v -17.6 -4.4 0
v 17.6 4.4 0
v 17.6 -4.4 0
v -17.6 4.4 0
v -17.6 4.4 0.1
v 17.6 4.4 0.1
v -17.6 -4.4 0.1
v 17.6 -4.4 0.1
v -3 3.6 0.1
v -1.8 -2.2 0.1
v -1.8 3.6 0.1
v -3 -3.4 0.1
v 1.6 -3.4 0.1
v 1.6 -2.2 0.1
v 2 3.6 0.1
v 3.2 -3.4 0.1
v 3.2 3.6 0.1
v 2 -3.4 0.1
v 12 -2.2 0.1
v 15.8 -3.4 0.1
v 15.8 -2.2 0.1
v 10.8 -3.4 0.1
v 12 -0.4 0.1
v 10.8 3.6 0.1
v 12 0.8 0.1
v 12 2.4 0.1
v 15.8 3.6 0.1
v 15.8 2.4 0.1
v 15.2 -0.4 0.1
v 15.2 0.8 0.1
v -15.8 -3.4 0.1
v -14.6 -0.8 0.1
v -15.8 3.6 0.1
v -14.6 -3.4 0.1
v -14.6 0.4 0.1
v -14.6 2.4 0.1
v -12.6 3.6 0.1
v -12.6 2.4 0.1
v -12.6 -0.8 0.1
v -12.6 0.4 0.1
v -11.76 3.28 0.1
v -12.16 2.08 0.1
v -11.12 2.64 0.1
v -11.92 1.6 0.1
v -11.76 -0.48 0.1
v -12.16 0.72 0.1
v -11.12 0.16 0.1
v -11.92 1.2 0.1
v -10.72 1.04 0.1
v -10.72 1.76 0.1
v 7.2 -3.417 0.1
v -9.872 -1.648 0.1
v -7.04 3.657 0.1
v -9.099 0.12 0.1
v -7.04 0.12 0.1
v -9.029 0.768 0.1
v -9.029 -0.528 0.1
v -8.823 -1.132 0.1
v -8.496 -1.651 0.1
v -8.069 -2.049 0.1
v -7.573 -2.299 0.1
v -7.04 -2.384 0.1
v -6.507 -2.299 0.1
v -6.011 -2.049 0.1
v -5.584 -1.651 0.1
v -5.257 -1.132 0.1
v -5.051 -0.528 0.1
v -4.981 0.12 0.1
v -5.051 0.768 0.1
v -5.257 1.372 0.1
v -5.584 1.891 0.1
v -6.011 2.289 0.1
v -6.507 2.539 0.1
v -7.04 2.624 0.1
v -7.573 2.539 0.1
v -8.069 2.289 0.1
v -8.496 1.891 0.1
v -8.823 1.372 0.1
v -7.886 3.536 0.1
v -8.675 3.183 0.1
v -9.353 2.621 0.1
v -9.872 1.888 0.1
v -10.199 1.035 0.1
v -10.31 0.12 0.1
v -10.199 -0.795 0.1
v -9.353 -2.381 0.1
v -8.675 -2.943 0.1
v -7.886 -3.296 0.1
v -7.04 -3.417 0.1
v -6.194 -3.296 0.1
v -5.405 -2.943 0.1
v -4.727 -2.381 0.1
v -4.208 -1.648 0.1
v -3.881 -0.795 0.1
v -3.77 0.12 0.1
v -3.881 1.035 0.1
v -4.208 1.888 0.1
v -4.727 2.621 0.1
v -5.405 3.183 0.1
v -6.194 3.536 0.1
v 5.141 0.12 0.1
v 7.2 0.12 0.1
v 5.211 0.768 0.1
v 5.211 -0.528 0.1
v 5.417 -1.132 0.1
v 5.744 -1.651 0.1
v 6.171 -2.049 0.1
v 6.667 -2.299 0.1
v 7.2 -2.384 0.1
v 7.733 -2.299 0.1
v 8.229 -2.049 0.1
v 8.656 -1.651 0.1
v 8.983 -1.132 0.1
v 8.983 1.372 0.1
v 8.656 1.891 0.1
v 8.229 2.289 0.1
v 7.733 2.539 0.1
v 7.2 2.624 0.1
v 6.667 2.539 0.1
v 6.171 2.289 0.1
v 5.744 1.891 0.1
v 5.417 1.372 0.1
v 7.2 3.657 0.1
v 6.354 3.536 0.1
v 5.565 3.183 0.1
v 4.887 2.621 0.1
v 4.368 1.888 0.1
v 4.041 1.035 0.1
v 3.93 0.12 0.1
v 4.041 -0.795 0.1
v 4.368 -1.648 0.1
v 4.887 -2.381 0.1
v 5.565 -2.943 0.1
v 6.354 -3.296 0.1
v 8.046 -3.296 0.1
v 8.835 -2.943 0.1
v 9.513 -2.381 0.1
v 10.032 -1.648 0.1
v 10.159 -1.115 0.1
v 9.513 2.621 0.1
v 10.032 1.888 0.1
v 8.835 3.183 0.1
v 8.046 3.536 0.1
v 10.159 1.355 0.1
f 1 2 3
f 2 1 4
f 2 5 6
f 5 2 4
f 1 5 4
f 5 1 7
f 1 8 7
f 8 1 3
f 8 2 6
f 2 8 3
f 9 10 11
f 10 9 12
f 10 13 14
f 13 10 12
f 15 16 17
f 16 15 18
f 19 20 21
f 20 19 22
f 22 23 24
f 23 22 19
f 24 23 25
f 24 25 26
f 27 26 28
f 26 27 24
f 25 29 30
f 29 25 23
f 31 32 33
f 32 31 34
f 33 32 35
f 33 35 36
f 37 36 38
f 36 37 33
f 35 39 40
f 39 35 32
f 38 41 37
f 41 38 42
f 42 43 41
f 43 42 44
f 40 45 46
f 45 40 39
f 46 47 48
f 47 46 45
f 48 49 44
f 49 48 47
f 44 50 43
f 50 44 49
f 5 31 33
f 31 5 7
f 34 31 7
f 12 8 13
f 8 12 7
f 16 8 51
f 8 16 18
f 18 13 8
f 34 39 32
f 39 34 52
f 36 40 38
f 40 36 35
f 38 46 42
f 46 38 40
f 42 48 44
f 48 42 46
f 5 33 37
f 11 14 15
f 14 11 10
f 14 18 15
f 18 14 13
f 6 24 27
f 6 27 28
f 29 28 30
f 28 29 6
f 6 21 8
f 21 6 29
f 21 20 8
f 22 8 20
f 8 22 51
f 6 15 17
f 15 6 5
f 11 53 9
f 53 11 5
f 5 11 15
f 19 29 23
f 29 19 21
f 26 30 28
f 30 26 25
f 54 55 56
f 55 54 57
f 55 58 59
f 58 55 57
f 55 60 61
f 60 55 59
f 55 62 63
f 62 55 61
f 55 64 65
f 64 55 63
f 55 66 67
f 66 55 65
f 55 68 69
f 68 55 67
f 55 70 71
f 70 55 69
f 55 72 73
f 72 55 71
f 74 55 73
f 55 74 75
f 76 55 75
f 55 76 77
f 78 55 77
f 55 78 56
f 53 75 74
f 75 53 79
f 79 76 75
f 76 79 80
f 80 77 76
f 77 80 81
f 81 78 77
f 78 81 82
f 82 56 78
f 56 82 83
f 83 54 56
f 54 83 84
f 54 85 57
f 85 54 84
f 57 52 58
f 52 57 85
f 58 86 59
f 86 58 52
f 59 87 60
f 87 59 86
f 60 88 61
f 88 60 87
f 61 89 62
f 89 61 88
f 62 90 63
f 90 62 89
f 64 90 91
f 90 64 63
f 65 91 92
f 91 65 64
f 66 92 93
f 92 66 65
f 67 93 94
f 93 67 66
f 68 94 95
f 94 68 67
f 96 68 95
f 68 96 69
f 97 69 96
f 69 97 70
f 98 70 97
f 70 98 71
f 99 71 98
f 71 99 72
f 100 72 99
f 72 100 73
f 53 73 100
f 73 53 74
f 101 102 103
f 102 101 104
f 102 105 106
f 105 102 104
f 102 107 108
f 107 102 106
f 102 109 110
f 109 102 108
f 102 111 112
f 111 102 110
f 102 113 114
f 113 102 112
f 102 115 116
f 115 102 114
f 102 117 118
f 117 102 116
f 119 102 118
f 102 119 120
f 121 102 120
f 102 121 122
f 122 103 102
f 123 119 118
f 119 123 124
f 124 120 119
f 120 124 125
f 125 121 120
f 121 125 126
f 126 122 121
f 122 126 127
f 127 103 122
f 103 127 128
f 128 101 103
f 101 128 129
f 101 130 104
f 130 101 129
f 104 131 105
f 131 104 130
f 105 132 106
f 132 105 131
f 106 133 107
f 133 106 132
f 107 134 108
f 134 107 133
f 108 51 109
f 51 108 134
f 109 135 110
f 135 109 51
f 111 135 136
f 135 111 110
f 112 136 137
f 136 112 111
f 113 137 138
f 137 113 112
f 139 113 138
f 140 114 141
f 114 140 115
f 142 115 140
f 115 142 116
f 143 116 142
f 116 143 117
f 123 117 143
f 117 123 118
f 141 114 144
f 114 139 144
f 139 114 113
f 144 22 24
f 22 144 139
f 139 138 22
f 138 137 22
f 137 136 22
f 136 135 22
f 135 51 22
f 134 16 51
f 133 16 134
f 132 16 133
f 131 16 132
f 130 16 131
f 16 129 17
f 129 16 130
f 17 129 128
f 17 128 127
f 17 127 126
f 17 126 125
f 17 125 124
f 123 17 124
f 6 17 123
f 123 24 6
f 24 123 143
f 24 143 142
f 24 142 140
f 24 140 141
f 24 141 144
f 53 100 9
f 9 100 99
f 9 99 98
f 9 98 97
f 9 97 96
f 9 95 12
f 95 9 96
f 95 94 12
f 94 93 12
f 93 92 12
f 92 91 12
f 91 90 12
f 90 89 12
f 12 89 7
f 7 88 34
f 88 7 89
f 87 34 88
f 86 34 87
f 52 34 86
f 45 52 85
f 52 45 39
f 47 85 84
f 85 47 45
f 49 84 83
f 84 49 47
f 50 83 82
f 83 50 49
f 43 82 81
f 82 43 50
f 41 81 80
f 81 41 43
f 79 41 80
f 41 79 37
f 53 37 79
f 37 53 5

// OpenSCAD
// file: ../p/box5-12.scad
use <../lib.scad>
function ldraw_lib__box5_12() = [
// 0 Box with 5 Faces without Any Edges
// 0 Name: box5-12.dat
// 0 Author: Chris Dee [cwdee]
// 0 !LDRAW_ORG Primitive UPDATE 2009-02
// 0 !LICENSE Licensed under CC BY 4.0 : see CAreadme.txt
// 
// 0 BFC CERTIFY CCW
  [0,"BFC","CERTIFY"],
  [0,"BFC","CCW"],
// 
// 0 !HISTORY 2009-09-03 [PTadmin] Official Update 2009-02
// 
// 
// 4 16 1 1 1 1 1 -1 -1 1 -1 -1 1 1
  [4,16,1,1,1,1,1,-1,-1,1,-1,-1,1,1],
// 4 16 -1 0 1 1 0 1 1 1 1 -1 1 1
  [4,16,-1,0,1,1,0,1,1,1,1,-1,1,1],
// 4 16 -1 0 -1 -1 0 1 -1 1 1 -1 1 -1
  [4,16,-1,0,-1,-1,0,1,-1,1,1,-1,1,-1],
// 4 16 1 0 -1 -1 0 -1 -1 1 -1 1 1 -1
  [4,16,1,0,-1,-1,0,-1,-1,1,-1,1,1,-1],
// 4 16 1 0 1 1 0 -1 1 1 -1 1 1 1
  [4,16,1,0,1,1,0,-1,1,1,-1,1,1,1],
// 0
];
module ldraw_lib__box5_12(step=0, col=false, unit=2/5, alt=false, line=0.2, solid=!$preview)
    makepoly(ldraw_lib__box5_12(), step=step, col=col, unit=unit, alt=alt, line=line, solid=solid);
ldraw_lib__box5_12(line=0.2);
// main file
use <../lib.scad>
use <197875a.scad>
function ldraw_lib__820671b() = [
// 0 =Sticker  1.1 x  4.4 with White "Police"
// 0 Name: 820671b.dat
// 0 Author: Takeshi Takahashi [RainbowDolphin]
// 0 !LDRAW_ORG Part Alias UPDATE 2025-03
// 0 !LICENSE Licensed under CC BY 4.0 : see CAreadme.txt
// 
// 0 BFC CERTIFY CCW
  [0,"BFC","CERTIFY"],
  [0,"BFC","CCW"],
// 
// 0 !KEYWORDS boat, Pier police, Set 6540, ship
// 
// 0 !HISTORY 2025-03-30 [OrionP] Official Update 2025-03
// 
// 1 16 0 0 0 1 0 0 0 1 0 0 0 1 197875a.dat
  [1,16,0,0,0,1,0,0,0,1,0,0,0,1, ldraw_lib__197875a()],
];
module ldraw_lib__820671b(step=0, col=false, unit=2/5, alt=false, line=0.2, solid=!$preview)
    makepoly(ldraw_lib__820671b(), step=step, col=col, unit=unit, alt=alt, line=line, solid=solid);
ldraw_lib__820671b(line=0.2);
